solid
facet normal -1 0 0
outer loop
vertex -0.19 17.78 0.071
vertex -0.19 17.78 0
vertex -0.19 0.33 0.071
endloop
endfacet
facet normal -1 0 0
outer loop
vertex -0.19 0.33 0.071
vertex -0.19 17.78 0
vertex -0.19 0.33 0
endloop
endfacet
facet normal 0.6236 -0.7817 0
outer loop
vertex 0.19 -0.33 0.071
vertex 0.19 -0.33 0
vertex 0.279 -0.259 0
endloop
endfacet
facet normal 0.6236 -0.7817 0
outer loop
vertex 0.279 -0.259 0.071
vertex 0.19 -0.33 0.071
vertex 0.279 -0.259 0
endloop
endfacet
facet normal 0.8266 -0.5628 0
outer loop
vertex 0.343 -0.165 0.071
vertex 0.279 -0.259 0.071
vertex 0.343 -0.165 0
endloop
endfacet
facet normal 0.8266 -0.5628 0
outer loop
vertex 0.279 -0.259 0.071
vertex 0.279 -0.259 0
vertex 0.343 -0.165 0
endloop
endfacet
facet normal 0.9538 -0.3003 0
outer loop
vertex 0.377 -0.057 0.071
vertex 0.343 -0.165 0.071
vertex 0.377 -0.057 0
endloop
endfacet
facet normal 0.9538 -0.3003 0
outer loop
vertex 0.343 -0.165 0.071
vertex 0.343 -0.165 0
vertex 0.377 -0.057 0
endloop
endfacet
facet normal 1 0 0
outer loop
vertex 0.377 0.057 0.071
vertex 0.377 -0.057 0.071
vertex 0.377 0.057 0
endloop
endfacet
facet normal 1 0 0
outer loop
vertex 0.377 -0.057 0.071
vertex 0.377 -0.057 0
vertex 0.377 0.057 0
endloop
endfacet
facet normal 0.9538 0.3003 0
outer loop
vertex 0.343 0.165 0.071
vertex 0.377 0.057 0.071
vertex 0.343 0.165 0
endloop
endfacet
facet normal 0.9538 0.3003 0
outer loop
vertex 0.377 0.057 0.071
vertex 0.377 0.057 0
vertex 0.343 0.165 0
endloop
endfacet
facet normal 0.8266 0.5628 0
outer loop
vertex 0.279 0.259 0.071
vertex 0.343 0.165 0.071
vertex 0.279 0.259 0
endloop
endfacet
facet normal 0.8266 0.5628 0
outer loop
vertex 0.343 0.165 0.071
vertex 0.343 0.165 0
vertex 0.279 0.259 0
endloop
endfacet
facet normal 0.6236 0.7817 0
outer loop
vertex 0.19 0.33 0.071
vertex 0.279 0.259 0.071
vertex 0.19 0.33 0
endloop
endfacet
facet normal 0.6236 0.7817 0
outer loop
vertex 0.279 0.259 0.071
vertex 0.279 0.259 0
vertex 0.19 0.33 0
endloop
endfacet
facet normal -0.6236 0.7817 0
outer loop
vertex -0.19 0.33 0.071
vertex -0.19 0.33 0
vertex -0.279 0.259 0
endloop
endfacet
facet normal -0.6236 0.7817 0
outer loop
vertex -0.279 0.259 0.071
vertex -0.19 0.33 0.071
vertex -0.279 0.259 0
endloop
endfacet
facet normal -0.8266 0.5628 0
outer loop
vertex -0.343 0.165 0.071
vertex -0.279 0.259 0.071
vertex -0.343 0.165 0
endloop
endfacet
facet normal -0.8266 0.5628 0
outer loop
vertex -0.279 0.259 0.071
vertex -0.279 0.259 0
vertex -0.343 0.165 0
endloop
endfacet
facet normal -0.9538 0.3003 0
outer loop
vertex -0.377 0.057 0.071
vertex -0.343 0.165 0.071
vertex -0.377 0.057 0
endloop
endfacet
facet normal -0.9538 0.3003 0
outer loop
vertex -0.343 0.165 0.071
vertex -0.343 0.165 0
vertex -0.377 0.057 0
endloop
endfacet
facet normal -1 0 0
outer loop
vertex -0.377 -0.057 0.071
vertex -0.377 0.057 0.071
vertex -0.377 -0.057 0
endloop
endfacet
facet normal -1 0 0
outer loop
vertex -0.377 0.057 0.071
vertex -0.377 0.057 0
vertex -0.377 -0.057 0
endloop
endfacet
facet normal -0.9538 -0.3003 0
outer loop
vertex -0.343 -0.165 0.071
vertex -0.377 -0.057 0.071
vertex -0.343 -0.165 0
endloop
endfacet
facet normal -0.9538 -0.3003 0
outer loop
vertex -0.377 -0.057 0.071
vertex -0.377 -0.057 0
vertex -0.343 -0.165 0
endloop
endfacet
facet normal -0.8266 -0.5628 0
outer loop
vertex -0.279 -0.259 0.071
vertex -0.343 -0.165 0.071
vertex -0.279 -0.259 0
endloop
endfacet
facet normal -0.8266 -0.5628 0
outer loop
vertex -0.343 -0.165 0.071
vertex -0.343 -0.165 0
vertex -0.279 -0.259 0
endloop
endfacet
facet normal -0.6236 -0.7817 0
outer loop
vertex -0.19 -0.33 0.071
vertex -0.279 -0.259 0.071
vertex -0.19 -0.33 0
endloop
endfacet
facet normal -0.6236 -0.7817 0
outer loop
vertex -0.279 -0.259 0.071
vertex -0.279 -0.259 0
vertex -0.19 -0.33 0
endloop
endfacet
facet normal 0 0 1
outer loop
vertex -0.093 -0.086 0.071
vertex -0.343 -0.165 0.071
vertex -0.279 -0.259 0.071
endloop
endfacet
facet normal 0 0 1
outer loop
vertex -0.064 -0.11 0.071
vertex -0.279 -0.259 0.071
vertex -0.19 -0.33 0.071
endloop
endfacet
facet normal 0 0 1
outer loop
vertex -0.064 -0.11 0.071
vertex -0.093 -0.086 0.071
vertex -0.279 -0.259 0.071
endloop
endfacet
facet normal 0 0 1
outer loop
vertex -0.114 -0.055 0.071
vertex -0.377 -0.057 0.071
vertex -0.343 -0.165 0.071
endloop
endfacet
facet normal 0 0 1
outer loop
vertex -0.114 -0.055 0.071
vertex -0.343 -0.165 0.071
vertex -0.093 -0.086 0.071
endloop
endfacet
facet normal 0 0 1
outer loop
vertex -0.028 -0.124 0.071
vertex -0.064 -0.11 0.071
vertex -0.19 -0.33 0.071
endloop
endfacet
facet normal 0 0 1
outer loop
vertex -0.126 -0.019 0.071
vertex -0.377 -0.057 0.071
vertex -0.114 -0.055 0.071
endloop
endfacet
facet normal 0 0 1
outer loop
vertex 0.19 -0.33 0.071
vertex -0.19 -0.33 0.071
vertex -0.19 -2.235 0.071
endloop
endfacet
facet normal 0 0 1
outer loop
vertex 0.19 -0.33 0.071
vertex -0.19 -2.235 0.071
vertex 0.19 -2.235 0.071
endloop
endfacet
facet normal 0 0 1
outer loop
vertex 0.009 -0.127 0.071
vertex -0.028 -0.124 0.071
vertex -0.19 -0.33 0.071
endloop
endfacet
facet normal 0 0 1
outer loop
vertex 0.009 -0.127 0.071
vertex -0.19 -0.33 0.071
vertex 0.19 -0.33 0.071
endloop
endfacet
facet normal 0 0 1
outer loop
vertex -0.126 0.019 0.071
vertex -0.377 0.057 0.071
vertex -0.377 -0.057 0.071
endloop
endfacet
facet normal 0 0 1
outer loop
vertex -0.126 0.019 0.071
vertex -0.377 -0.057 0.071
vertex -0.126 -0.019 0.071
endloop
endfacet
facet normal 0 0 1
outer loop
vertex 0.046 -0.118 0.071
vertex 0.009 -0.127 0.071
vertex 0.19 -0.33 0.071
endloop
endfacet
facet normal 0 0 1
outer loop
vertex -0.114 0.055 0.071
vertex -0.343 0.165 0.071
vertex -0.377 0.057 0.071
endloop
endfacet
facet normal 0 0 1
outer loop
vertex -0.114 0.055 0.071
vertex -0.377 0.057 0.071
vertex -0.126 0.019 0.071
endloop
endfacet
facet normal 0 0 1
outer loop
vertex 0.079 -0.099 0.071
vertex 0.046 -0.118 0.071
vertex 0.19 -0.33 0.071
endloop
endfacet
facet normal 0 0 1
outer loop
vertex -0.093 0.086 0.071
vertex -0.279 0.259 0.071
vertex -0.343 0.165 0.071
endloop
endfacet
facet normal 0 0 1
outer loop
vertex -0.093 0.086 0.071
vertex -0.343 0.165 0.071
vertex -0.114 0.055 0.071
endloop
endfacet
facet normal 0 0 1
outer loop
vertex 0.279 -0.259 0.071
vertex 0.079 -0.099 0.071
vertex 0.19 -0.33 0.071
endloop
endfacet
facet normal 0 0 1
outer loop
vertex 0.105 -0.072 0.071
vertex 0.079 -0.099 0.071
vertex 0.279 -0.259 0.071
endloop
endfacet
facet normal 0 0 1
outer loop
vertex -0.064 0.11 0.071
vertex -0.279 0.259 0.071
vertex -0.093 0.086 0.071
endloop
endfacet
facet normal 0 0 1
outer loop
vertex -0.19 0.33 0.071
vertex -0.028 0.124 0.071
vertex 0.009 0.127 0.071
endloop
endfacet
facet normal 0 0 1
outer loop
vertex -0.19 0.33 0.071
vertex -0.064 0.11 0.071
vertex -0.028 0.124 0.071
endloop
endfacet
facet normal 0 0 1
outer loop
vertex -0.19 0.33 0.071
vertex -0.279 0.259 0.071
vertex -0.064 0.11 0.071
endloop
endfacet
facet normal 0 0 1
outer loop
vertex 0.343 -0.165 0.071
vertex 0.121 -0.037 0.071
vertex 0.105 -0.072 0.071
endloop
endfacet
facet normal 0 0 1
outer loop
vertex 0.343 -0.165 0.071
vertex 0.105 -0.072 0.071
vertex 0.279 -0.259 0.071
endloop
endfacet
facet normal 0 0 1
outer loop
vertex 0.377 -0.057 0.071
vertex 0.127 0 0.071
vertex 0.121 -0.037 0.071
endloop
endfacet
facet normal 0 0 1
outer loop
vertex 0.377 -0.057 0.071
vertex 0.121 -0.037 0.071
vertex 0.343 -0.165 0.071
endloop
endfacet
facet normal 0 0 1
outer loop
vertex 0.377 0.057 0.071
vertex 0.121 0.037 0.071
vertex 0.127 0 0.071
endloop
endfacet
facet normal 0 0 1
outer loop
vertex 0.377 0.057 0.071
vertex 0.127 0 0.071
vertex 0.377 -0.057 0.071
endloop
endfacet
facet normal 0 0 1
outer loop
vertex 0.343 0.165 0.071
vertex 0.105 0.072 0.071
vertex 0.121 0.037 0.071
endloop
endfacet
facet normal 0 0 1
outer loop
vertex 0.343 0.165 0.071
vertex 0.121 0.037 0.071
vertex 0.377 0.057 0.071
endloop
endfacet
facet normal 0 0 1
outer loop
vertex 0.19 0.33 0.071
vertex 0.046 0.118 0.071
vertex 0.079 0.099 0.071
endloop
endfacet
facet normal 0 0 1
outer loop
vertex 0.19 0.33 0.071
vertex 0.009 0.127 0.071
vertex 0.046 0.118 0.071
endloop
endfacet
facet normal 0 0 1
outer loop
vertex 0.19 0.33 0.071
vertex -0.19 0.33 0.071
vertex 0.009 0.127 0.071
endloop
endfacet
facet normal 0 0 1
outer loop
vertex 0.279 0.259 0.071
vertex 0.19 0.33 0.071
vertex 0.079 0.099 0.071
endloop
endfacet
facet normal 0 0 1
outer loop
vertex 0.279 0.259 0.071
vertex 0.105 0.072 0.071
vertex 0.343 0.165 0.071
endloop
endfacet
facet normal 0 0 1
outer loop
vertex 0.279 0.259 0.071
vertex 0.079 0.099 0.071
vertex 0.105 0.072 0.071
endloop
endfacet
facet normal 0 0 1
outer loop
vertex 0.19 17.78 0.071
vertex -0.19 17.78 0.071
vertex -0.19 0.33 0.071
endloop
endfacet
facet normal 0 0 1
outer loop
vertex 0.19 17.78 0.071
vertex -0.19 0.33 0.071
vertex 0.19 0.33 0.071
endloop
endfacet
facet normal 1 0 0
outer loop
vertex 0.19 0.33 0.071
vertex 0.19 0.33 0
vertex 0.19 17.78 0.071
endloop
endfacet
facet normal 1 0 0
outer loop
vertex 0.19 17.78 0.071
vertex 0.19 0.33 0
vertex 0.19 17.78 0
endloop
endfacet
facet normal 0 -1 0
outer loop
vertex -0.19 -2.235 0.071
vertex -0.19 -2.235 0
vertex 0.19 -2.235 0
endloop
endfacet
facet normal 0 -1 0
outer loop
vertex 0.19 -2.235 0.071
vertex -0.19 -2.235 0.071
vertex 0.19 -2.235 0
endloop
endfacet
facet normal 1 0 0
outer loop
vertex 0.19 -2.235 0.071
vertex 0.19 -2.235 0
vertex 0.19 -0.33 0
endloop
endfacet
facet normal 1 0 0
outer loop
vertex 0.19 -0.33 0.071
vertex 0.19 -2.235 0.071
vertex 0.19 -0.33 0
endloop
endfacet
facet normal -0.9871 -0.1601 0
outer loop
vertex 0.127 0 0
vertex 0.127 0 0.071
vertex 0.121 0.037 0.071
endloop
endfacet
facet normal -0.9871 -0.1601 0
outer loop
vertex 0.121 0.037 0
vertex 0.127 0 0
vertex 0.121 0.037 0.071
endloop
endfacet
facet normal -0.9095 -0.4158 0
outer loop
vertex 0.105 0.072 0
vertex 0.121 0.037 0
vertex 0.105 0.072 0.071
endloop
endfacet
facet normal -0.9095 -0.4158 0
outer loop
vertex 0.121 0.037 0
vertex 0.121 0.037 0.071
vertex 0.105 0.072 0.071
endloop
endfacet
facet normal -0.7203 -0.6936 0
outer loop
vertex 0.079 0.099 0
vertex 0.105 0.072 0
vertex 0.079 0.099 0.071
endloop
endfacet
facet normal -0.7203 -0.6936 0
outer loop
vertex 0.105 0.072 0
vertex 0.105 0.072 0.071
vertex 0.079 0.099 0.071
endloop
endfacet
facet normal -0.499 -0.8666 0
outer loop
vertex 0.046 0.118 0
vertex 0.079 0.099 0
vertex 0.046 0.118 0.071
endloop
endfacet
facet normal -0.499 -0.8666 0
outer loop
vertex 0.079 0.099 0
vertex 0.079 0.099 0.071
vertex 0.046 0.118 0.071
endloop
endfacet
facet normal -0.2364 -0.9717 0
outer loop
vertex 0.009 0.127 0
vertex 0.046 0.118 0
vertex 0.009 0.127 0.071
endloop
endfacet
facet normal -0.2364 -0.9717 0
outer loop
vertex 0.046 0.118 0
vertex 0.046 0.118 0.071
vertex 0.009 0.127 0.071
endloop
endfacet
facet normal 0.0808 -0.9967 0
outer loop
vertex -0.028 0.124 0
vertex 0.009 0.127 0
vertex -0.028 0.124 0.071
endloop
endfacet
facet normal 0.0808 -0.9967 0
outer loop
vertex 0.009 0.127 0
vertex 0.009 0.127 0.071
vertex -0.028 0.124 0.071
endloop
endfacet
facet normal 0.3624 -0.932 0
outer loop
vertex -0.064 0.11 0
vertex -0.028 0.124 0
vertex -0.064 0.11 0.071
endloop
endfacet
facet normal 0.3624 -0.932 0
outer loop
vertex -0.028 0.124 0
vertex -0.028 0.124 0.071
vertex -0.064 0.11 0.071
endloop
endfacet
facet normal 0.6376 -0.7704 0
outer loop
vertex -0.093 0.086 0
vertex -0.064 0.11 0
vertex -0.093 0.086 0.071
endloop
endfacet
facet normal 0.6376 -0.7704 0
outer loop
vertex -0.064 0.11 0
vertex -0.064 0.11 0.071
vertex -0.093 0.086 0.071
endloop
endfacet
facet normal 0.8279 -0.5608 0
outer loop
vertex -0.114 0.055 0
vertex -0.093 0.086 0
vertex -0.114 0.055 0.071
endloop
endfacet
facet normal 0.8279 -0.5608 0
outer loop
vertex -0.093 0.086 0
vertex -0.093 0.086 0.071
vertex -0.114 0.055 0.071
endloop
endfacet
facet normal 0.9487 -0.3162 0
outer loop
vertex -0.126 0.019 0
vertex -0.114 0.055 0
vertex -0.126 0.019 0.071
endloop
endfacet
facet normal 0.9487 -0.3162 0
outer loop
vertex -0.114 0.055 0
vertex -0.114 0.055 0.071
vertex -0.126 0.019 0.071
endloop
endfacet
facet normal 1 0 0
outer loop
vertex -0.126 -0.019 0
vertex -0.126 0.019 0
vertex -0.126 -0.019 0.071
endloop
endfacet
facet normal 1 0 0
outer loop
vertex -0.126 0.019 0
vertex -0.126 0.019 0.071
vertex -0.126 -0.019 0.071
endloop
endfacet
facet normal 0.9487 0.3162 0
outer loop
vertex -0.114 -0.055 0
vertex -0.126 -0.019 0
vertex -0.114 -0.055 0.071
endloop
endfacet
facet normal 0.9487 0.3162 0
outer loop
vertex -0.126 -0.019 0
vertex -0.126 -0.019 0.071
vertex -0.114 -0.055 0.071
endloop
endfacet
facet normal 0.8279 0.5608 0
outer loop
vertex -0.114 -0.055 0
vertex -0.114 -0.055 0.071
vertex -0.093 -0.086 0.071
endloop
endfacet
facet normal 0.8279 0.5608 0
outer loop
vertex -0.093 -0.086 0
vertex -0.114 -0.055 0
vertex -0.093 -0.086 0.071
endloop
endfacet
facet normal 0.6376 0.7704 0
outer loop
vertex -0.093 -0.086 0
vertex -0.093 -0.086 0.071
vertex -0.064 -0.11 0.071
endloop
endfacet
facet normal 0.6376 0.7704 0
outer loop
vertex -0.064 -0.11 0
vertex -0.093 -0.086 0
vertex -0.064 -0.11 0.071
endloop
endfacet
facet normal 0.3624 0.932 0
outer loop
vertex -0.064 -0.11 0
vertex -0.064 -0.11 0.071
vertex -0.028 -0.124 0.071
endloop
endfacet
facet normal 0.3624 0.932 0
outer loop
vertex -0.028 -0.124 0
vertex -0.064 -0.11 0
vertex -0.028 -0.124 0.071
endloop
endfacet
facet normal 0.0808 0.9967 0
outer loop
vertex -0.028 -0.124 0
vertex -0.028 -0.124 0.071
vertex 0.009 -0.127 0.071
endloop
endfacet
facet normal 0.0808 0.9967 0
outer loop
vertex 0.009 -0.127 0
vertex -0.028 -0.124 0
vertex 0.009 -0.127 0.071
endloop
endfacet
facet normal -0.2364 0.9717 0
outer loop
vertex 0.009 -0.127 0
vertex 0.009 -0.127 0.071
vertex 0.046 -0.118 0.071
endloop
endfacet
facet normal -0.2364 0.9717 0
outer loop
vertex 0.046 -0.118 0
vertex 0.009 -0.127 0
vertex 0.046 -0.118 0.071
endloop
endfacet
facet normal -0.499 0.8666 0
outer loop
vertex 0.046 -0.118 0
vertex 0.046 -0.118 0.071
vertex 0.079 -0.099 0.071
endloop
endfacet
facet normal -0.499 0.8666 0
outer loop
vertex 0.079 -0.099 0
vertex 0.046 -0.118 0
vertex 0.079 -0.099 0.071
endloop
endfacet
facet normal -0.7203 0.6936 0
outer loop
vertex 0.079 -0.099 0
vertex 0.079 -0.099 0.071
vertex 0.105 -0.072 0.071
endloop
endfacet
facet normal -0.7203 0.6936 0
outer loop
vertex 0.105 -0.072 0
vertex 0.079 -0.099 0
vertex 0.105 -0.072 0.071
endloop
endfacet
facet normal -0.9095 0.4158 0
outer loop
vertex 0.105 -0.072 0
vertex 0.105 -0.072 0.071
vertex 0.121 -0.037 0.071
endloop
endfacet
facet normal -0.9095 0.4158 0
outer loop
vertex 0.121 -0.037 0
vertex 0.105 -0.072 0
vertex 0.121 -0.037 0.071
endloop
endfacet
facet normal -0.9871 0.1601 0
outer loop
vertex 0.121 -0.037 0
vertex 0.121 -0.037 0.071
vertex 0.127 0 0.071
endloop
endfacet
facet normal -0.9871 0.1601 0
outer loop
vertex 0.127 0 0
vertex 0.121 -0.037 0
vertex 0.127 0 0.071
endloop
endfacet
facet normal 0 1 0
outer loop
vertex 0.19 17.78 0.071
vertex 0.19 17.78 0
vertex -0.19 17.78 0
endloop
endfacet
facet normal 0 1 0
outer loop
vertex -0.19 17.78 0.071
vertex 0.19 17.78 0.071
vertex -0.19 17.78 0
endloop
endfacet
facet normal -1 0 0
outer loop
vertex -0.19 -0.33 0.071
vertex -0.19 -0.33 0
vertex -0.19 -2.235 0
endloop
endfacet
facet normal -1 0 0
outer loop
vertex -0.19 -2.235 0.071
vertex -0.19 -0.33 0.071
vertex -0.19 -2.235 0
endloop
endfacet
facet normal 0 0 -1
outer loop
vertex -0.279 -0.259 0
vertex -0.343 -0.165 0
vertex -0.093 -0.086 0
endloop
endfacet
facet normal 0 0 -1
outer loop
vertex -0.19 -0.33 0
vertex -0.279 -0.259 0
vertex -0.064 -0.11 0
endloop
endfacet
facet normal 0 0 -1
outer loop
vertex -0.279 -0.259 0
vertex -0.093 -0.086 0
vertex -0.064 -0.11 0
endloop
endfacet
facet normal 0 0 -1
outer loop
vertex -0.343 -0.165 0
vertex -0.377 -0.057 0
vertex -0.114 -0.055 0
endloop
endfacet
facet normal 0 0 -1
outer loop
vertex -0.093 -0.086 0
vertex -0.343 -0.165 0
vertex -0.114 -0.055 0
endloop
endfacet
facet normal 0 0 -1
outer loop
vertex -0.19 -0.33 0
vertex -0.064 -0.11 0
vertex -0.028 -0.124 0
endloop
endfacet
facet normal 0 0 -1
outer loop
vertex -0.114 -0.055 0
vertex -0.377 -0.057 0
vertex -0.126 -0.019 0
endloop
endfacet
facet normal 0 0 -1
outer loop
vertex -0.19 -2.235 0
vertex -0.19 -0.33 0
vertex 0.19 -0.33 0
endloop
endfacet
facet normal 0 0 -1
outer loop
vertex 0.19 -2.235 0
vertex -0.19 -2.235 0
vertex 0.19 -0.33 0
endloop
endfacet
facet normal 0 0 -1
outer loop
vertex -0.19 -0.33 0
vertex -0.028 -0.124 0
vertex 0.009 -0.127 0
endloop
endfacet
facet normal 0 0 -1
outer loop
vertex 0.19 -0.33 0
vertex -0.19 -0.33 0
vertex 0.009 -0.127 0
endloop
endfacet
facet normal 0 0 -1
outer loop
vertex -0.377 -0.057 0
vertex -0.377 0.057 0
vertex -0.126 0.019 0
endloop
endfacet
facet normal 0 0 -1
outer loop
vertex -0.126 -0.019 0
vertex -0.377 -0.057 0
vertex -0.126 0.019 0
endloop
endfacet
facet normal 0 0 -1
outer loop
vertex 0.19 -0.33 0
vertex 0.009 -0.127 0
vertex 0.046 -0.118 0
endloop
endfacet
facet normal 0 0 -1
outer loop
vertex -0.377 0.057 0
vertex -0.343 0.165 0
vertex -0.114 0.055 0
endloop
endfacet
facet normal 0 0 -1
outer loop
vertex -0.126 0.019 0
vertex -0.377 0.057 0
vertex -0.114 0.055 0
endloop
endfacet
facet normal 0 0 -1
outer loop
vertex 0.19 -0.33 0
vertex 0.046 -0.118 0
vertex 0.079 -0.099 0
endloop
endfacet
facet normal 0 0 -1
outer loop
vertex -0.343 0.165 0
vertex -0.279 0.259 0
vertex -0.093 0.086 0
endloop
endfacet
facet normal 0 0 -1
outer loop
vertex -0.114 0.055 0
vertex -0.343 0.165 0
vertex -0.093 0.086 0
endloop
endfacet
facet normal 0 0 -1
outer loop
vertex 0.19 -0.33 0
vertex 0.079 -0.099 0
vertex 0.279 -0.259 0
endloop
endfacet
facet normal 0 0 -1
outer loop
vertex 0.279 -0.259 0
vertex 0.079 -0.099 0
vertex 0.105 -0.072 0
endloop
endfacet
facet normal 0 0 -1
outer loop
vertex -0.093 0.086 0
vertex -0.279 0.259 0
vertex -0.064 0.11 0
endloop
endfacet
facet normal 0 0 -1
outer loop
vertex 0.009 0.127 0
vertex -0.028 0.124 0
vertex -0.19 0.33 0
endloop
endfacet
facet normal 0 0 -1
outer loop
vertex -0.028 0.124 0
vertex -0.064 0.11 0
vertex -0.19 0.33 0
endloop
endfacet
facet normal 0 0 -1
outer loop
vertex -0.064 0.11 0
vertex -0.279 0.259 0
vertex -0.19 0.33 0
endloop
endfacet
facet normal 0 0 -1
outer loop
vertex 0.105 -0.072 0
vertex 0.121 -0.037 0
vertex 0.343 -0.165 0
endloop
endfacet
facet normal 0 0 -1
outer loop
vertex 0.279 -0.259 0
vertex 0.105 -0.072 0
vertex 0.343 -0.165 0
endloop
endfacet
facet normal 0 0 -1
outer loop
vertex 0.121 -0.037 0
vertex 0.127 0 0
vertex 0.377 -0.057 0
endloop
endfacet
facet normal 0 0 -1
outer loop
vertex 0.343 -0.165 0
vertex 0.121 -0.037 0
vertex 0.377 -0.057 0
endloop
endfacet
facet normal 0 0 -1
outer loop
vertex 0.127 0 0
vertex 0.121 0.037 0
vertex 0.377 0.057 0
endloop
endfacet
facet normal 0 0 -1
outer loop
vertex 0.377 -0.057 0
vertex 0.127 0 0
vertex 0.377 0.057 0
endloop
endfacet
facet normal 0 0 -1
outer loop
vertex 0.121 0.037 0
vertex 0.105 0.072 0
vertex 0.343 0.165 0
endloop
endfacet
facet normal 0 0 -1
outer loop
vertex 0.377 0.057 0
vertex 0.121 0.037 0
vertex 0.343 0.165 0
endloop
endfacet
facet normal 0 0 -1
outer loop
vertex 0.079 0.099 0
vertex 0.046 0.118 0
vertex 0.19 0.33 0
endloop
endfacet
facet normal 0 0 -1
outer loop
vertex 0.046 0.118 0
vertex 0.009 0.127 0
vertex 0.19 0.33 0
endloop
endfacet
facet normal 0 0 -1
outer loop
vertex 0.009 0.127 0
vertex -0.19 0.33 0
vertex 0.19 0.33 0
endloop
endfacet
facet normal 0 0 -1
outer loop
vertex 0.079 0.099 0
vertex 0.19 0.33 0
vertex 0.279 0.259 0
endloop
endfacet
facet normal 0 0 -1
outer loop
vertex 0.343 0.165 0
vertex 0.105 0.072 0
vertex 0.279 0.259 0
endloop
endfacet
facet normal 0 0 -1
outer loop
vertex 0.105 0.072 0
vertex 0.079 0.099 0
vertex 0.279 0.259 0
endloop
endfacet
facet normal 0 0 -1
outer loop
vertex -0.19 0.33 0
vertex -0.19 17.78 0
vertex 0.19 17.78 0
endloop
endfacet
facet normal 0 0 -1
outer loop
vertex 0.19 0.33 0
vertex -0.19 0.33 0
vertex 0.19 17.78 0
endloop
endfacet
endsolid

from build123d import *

# Parameters (mm, degrees)
F1_DEPTH = 0.07112
F2_R     = 0.127
F3_DEPTH = 25.4


with BuildPart() as f1:
    # F0 (on Top) → F1 (new body)
    with BuildSketch(Plane.XY):
        with BuildLine():
            Line((-0.1905, 17.779756), (-0.1905, 0.329956))
            ThreePointArc((-0.1905, 0.329956), (-0.381, 0), (-0.1905, -0.329956))
            Line((-0.1905, -0.329956), (-0.1905, -2.234956))
            Line((-0.1905, -2.234956), (0, -2.234956))
            Line((0, -2.234956), (0.1905, -2.234956))
            Line((0.1905, -2.234956), (0.1905, -0.329956))
            ThreePointArc((0.1905, -0.329956), (0.381, 0), (0.1905, 0.329956))
            Line((0.1905, 0.329956), (0.1905, 17.779756))
            Line((0.1905, 17.779756), (0, 17.779756))
            Line((0, 17.779756), (-0.1905, 17.779756))
        make_face()
    extrude(amount=F1_DEPTH)

    # F2 (on face) → F3 (cut)
    with BuildSketch(Plane.XY.offset(0.07112)):
        Circle(F2_R)
    extrude(amount=-F3_DEPTH, mode=Mode.SUBTRACT)


solid = f1.part
